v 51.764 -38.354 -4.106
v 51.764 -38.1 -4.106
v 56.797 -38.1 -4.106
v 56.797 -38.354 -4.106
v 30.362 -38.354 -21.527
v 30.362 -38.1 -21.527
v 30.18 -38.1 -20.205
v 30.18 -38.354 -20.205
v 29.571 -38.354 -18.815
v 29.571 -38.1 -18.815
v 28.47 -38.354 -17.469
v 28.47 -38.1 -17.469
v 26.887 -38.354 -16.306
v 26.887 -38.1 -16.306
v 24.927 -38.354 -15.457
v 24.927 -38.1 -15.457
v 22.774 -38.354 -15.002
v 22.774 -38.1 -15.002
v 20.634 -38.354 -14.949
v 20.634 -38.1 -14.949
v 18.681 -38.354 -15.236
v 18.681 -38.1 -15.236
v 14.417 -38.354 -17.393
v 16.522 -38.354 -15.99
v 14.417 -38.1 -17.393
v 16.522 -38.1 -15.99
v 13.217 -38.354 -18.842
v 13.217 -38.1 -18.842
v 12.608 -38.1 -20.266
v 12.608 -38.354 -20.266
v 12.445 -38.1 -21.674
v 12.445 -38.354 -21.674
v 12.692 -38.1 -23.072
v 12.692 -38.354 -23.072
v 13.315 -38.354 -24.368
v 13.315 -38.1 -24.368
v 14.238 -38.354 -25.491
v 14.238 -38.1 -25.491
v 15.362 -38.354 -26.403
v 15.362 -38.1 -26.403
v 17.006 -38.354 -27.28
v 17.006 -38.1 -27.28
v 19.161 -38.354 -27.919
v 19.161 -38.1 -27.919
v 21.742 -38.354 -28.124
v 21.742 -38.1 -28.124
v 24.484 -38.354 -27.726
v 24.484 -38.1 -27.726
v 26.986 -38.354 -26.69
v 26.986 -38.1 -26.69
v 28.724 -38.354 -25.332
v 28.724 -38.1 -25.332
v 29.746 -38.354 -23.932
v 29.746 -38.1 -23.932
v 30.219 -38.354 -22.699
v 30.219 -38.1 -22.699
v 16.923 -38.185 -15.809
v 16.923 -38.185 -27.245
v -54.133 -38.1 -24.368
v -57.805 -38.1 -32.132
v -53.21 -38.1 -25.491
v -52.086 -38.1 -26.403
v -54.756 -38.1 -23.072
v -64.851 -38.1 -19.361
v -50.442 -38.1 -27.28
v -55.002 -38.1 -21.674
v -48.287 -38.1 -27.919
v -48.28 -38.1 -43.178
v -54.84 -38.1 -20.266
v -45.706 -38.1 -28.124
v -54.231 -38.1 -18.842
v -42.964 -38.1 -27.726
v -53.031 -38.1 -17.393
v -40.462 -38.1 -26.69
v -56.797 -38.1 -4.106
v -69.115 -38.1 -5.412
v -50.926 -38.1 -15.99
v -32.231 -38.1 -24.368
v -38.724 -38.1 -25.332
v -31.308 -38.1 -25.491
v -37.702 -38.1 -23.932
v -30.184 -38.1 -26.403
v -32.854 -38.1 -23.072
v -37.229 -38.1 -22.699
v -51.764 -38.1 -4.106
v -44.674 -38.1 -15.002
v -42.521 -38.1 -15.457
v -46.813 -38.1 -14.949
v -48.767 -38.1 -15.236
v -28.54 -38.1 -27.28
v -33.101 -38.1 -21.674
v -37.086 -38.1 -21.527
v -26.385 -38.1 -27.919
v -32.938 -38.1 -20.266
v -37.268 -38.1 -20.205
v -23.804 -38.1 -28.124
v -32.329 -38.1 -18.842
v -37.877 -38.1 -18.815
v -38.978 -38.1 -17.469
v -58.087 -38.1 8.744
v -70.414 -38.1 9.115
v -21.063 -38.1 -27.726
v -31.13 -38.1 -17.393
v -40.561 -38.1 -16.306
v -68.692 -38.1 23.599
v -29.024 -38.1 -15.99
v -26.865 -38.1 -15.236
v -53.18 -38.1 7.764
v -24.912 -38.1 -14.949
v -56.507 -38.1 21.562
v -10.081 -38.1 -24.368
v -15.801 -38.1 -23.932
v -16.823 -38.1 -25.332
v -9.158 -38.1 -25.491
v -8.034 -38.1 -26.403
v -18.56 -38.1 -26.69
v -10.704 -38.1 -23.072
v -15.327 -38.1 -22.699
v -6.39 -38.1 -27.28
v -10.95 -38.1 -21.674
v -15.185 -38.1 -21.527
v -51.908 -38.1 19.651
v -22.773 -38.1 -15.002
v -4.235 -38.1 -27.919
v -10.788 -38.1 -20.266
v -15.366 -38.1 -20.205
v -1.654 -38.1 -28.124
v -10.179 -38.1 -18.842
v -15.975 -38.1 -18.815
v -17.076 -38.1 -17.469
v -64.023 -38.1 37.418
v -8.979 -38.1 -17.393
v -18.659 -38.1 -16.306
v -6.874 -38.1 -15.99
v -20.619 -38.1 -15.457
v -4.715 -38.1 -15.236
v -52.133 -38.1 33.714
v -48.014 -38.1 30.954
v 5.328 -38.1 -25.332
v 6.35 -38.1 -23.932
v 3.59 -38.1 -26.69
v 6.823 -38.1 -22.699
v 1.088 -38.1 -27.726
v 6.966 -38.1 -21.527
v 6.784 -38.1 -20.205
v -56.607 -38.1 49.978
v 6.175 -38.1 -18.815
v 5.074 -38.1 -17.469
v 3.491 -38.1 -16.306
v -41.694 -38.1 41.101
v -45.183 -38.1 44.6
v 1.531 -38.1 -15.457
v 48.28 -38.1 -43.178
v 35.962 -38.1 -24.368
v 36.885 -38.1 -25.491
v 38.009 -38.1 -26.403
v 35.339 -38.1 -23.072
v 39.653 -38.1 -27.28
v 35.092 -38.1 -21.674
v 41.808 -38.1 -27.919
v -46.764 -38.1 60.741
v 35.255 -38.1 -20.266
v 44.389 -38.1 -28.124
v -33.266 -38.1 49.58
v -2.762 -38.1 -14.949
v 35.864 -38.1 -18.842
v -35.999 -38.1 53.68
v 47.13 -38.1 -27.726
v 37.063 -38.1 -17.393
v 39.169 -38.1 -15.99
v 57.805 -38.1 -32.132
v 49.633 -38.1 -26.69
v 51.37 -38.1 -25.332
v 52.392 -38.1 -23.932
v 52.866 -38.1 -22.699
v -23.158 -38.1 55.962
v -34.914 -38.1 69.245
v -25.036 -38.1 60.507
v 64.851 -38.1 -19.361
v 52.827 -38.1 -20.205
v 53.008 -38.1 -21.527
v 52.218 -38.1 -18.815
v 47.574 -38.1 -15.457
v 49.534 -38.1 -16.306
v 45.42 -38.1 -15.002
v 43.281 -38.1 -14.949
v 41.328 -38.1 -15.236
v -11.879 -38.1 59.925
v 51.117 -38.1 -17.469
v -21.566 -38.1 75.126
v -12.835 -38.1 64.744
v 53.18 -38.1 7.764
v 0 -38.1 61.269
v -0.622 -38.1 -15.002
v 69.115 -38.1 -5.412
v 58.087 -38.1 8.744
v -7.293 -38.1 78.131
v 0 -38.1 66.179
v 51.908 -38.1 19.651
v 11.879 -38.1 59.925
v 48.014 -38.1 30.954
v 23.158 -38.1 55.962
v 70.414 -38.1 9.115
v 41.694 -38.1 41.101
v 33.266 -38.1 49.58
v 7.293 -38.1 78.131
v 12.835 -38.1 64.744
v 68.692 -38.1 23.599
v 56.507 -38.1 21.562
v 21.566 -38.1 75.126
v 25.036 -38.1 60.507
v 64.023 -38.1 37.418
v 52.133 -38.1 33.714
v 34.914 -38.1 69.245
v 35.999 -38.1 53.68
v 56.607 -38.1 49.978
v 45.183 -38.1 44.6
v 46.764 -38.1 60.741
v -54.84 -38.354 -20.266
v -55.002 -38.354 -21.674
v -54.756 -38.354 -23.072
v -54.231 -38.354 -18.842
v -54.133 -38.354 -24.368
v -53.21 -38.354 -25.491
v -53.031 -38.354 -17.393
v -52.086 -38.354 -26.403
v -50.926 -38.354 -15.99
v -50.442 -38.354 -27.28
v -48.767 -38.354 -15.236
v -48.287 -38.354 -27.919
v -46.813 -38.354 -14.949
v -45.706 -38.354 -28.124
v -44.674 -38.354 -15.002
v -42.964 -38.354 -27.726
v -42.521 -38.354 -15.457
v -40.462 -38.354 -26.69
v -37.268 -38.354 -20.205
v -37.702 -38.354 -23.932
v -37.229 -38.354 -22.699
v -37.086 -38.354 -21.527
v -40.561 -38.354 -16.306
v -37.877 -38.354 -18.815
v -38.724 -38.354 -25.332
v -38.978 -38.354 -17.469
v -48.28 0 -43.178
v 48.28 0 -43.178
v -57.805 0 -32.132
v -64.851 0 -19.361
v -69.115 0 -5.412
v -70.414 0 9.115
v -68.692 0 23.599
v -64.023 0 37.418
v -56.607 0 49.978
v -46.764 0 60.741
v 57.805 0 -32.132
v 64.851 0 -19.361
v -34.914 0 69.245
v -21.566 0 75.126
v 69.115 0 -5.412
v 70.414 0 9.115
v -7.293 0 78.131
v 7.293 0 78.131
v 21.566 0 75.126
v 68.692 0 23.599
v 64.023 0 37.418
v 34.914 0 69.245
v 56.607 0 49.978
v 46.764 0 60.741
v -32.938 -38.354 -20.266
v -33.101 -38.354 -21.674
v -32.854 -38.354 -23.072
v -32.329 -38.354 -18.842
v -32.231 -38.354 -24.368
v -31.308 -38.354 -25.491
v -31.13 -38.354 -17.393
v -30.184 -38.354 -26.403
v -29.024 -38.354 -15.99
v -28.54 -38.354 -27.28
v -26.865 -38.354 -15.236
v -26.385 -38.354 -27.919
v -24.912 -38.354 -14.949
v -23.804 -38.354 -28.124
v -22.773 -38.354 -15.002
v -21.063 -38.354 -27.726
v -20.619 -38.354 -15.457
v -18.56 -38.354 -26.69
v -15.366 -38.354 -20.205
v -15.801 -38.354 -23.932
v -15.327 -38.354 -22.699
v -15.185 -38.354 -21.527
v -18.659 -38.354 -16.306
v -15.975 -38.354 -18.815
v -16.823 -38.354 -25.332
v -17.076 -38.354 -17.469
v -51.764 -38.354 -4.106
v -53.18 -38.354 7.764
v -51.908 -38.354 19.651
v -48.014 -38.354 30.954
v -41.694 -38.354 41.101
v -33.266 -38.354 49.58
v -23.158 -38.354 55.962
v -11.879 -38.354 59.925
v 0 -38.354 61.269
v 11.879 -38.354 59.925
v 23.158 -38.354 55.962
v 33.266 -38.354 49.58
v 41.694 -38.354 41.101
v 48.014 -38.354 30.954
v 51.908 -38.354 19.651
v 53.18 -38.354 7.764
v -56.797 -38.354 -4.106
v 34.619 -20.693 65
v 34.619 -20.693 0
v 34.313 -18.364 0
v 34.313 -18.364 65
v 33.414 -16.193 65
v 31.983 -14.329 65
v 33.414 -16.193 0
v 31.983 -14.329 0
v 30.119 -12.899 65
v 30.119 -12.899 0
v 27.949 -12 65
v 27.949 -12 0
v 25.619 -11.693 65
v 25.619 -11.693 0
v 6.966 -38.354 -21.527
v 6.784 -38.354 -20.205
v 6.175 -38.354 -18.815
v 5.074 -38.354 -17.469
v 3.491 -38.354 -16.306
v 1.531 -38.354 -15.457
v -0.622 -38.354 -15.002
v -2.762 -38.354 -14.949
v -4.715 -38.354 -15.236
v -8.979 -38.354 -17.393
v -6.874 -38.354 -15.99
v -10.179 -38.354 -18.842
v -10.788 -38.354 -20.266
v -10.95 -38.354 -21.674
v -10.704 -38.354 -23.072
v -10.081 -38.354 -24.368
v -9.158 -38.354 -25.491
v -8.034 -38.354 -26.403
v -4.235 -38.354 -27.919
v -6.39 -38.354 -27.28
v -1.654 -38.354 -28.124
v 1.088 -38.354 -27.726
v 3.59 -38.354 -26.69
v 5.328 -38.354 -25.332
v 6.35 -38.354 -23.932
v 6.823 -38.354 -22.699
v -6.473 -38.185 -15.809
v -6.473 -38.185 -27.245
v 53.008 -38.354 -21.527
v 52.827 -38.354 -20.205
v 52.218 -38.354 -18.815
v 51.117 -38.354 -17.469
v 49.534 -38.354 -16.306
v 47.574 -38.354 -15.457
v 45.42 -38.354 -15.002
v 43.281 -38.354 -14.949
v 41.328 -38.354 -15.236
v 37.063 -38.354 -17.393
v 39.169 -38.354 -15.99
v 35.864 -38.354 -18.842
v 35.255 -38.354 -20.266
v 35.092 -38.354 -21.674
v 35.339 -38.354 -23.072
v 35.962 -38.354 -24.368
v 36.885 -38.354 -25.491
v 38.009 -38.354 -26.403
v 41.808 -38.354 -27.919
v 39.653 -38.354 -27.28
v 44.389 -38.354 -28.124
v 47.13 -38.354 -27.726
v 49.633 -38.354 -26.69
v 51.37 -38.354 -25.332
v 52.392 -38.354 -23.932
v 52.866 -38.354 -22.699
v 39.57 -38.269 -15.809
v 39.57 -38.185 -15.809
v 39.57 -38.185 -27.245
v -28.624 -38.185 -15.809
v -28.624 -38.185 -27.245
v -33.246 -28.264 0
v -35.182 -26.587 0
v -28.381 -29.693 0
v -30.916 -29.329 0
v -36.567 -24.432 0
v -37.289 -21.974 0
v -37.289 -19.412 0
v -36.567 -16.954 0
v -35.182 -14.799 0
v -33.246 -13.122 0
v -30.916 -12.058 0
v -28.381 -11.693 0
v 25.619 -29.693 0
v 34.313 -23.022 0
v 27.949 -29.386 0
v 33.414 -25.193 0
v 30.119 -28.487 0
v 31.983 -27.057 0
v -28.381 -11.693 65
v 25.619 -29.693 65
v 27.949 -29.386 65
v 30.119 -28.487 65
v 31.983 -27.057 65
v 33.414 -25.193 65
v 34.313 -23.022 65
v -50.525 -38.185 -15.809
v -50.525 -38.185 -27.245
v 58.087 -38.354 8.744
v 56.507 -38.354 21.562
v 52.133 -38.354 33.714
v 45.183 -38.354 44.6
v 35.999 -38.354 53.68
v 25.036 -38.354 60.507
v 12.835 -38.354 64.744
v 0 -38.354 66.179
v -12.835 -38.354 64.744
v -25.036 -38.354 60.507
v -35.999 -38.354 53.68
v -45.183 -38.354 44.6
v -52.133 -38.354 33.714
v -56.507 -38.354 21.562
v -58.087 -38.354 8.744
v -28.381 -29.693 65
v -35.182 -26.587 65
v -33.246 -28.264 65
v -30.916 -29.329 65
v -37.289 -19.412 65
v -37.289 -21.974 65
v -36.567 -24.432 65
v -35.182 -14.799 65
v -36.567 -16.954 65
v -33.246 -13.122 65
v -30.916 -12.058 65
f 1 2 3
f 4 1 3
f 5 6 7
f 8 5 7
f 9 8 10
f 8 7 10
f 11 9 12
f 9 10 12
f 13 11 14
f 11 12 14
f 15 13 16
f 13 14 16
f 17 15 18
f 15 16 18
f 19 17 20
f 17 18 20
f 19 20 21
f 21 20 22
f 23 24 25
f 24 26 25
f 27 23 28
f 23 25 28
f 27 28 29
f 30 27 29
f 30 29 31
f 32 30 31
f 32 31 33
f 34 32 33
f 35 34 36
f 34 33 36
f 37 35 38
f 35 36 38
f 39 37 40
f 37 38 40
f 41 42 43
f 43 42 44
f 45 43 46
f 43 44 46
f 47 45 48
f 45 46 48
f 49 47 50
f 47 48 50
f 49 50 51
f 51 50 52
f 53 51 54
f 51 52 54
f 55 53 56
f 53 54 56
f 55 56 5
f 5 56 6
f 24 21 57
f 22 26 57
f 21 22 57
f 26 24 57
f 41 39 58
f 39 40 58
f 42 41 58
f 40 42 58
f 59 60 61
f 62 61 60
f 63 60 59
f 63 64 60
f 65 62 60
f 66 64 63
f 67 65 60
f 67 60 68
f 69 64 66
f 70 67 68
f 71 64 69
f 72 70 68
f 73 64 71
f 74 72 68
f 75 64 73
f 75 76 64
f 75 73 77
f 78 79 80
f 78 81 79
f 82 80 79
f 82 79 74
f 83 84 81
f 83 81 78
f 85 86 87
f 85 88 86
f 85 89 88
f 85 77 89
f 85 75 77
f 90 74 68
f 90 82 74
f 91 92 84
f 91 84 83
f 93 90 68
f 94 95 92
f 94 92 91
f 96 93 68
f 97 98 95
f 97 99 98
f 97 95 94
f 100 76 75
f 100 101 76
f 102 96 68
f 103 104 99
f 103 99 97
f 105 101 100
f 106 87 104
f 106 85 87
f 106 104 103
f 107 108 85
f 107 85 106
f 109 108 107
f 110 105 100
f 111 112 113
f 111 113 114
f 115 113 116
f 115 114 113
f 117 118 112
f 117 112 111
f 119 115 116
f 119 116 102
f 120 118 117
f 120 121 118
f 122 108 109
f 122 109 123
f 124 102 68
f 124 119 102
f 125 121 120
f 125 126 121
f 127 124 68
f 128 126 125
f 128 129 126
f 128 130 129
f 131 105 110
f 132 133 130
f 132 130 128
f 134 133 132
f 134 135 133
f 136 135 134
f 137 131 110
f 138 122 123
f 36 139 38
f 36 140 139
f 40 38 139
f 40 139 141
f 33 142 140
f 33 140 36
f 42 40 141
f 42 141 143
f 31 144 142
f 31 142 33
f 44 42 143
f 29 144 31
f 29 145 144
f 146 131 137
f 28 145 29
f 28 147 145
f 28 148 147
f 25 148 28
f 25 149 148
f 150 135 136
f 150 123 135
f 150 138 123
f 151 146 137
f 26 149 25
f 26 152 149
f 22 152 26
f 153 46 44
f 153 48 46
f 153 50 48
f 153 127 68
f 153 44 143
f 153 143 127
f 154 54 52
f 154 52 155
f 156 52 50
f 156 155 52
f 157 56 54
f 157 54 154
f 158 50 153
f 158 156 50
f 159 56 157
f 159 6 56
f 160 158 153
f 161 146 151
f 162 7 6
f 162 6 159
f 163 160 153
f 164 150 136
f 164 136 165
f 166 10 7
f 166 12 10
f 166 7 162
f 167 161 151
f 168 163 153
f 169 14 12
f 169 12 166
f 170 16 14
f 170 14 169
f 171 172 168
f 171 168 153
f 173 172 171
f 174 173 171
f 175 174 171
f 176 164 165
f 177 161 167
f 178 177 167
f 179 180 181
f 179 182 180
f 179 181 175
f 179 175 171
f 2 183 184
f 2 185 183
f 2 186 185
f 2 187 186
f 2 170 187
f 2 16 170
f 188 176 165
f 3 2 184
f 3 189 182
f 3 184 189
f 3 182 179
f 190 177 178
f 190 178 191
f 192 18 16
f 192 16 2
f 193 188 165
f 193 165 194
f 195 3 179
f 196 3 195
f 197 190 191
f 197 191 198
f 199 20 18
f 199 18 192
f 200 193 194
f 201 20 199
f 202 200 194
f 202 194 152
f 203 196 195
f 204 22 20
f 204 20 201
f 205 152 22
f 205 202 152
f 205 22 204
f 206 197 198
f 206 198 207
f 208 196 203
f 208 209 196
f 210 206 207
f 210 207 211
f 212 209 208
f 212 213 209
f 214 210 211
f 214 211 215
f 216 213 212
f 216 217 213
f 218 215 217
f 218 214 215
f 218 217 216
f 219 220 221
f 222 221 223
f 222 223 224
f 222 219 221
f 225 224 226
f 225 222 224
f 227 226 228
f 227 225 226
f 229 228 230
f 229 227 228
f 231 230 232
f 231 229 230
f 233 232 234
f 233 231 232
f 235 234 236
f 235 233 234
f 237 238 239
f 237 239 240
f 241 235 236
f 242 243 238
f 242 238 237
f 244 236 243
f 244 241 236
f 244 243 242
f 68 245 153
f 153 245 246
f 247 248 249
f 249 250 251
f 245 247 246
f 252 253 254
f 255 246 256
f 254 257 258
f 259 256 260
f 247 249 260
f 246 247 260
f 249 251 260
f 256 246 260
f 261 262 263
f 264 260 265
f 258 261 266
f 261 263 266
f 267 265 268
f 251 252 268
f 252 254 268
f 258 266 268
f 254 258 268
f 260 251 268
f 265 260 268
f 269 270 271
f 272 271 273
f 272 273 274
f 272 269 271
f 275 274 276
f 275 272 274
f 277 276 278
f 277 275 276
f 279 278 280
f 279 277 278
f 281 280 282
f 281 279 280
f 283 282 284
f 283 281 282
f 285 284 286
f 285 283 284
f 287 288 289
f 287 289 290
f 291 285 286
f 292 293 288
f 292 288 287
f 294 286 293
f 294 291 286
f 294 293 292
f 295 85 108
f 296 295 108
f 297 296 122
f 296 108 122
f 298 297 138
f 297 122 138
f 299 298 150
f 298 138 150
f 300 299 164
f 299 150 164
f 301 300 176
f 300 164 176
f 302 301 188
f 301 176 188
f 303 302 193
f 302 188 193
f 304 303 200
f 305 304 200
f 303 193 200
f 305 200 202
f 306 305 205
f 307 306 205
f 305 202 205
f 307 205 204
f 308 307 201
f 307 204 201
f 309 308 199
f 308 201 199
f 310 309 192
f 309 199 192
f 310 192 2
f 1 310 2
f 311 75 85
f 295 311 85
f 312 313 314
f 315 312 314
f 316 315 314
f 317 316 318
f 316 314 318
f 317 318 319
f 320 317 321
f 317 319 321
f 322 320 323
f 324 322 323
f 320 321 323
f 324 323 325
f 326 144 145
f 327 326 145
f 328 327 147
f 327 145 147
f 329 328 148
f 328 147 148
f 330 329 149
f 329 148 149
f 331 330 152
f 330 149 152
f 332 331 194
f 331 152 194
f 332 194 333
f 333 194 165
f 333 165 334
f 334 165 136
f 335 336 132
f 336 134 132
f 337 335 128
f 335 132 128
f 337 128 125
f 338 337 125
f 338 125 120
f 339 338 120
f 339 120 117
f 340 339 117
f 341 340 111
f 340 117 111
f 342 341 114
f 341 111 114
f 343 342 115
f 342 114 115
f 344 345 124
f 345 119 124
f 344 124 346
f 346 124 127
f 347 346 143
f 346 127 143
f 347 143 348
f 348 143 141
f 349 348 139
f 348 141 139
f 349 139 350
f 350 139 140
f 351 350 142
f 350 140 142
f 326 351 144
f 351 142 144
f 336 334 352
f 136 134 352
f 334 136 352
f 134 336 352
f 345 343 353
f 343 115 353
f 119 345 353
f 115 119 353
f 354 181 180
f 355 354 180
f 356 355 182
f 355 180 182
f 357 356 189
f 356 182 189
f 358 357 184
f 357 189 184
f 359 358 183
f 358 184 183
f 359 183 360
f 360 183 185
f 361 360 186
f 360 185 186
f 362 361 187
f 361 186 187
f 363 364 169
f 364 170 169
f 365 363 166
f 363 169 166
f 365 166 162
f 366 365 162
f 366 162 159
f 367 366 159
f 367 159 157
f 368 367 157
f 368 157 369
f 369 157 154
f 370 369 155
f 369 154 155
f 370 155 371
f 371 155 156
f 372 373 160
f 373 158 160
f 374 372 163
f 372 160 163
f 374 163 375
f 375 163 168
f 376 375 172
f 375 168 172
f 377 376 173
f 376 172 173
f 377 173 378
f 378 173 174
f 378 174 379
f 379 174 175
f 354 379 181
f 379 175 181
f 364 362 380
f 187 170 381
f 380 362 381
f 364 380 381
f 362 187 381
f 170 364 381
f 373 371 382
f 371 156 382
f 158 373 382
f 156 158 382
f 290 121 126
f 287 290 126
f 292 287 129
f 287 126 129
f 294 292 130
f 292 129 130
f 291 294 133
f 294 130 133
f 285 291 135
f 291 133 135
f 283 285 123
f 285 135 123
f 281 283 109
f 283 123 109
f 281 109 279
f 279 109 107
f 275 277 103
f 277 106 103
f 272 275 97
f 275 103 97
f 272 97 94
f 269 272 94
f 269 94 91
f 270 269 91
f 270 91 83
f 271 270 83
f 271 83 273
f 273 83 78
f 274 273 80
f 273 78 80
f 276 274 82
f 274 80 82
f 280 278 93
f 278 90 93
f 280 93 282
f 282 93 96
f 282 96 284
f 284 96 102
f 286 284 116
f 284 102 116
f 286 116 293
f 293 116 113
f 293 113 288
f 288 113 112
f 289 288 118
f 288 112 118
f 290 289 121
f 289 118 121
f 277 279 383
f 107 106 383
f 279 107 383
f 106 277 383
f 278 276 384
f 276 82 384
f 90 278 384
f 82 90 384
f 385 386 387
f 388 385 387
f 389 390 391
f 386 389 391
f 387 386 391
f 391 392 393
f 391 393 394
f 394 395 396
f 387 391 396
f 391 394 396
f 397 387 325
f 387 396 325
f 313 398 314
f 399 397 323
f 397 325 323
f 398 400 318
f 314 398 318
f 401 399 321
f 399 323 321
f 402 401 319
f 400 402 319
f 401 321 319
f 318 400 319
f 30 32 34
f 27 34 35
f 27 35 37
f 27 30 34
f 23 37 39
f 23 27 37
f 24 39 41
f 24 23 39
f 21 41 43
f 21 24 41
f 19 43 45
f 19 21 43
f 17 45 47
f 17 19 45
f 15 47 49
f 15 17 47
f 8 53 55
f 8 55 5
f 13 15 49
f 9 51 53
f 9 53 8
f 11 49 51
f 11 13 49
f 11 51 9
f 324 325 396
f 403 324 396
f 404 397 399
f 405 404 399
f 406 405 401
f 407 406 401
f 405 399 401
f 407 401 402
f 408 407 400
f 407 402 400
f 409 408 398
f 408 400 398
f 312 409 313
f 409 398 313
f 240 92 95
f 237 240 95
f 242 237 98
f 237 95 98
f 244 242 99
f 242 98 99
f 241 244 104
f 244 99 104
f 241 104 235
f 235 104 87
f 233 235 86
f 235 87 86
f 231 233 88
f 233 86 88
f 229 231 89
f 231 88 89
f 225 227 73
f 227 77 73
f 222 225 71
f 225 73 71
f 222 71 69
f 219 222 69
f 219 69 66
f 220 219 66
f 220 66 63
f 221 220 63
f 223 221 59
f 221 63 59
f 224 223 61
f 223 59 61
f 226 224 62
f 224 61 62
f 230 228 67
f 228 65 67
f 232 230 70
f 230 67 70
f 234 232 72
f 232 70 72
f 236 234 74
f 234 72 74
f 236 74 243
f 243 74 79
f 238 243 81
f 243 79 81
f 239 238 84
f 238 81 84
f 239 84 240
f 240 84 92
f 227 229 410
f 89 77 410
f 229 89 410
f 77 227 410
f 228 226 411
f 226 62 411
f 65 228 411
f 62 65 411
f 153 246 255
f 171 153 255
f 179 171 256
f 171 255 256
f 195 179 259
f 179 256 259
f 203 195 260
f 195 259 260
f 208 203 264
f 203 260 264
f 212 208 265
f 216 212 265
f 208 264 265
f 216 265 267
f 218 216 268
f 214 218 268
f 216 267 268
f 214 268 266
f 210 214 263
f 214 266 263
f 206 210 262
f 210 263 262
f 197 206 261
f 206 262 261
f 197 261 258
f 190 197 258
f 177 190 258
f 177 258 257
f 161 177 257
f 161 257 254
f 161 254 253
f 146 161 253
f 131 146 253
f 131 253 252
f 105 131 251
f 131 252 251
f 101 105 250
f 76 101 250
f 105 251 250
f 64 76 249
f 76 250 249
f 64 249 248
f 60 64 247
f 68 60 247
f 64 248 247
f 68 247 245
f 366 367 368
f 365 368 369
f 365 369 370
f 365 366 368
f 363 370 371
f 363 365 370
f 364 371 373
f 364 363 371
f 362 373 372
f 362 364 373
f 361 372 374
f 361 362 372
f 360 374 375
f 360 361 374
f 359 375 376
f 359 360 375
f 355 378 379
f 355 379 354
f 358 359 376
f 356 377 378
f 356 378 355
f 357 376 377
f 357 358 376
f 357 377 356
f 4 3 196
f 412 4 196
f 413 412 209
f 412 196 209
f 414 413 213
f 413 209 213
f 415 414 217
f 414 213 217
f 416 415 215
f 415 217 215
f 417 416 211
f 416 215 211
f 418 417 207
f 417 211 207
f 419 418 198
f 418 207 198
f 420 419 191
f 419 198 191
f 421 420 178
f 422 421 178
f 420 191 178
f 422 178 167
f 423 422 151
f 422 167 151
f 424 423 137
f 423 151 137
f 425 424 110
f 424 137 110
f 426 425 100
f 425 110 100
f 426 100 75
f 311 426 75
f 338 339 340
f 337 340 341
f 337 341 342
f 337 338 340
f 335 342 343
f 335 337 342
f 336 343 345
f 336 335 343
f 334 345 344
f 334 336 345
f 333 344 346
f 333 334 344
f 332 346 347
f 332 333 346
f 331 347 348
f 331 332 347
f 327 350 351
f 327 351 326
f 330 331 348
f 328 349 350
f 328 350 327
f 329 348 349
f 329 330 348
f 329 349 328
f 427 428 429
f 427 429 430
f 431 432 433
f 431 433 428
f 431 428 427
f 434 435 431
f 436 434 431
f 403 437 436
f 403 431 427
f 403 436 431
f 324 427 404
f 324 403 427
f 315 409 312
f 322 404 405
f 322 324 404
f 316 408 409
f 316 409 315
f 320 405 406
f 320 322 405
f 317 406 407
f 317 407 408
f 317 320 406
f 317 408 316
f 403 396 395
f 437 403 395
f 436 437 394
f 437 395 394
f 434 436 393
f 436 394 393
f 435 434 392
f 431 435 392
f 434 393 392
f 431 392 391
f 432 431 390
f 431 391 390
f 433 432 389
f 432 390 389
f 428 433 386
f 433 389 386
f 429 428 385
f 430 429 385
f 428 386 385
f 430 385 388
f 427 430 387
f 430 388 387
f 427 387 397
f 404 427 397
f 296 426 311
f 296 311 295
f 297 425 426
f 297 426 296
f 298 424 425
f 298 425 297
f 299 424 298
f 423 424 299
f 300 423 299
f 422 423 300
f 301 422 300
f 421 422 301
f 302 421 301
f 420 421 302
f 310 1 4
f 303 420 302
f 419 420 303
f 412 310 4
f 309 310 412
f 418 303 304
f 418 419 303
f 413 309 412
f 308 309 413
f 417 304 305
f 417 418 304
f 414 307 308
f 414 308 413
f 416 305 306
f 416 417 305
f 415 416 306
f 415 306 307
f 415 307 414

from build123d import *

# Parameters (mm, degrees)
F1_DEPTH = 38.1
F3_DEPTH = 0.254
F5_DEPTH = 65


with BuildPart() as f1:
    # F0 (on Front) → F1 (new body)
    with BuildSketch(Plane.XZ):
        with BuildLine():
            ThreePointArc((48.2797399163, -43.178036809), (0, 78.5093375194), (-48.2797399163, -43.178036809))
            Line((-48.2797399163, -43.178036809), (48.2797399163, -43.178036809))
        make_face()
    extrude(amount=F1_DEPTH)

    # F2 (on face) → F3 (join)
    with BuildSketch(Plane.XZ.offset(38.1)):
        with BuildLine():
            add(Edge.make_bspline(
                [(-37.0862976189, -21.526746532), (-37.0862976189, -10.0909144428), (-50.524991798, -15.8088304874), (-63.9636859771, -21.526746532), (-50.524991798, -27.2446625766), (-37.0862976189, -32.9625786212), (-37.0862976189, -21.526746532)],
                knots=[0, 0, 0, 2.0943951024, 2.0943951024, 4.1887902048, 4.1887902048, 6.2831853072, 6.2831853072, 6.2831853072], degree=2, weights=[1, 0.5, 1, 0.5, 1, 0.5, 1]))
        make_face()
        with BuildLine():
            add(Edge.make_bspline(
                [(-15.1848064807, -21.526746532), (-15.1848064807, -10.0909144428), (-28.6235006598, -15.8088304874), (-42.0621948388, -21.526746532), (-28.6235006598, -27.2446625766), (-15.1848064807, -32.9625786212), (-15.1848064807, -21.526746532)],
                knots=[0, 0, 0, 2.0943951024, 2.0943951024, 4.1887902048, 4.1887902048, 6.2831853072, 6.2831853072, 6.2831853072], degree=2, weights=[1, 0.5, 1, 0.5, 1, 0.5, 1]))
        make_face()
        with BuildLine():
            add(Edge.make_bspline(
                [(6.9655476492, -21.526746532), (6.9655476492, -10.0909144428), (-6.4731465298, -15.8088304874), (-19.9118407089, -21.526746532), (-6.4731465298, -27.2446625766), (6.9655476492, -32.9625786212), (6.9655476492, -21.526746532)],
                knots=[0, 0, 0, 2.0943951024, 2.0943951024, 4.1887902048, 4.1887902048, 6.2831853072, 6.2831853072, 6.2831853072], degree=2, weights=[1, 0.5, 1, 0.5, 1, 0.5, 1]))
        make_face()
        with BuildLine():
            add(Edge.make_bspline(
                [(30.36152079, -21.526746532), (30.36152079, -10.0909144428), (16.9228266109, -15.8088304874), (3.4841324318, -21.526746532), (16.9228266109, -27.2446625766), (30.36152079, -32.9625786212), (30.36152079, -21.526746532)],
                knots=[0, 0, 0, 2.0943951024, 2.0943951024, 4.1887902048, 4.1887902048, 6.2831853072, 6.2831853072, 6.2831853072], degree=2, weights=[1, 0.5, 1, 0.5, 1, 0.5, 1]))
        make_face()
        with BuildLine():
            add(Edge.make_bspline(
                [(53.0082075507, -21.526746532), (53.0082075507, -10.0909144428), (39.5695133716, -15.8088304874), (26.1308191926, -21.526746532), (39.5695133716, -27.2446625766), (53.0082075507, -32.9625786212), (53.0082075507, -21.526746532)],
                knots=[0, 0, 0, 2.0943951024, 2.0943951024, 4.1887902048, 4.1887902048, 6.2831853072, 6.2831853072, 6.2831853072], degree=2, weights=[1, 0.5, 1, 0.5, 1, 0.5, 1]))
        make_face()
        with BuildLine():
            ThreePointArc((56.7967976493, -4.106244538), (0, 66.1792234388), (-56.7967976493, -4.106244538))
            Line((-56.7967976493, -4.106244538), (-51.7638213933, -4.106244538))
            ThreePointArc((-51.7638213933, -4.106244538), (0, 61.2688820478), (51.7638213933, -4.106244538))
            Line((51.7638213933, -4.106244538), (56.7967976493, -4.106244538))
        make_face()
    extrude(amount=F3_DEPTH)


with BuildPart() as f5:
    # F4 (on Top) → F5 (new body)
    with BuildSketch(Plane.XY):
        with BuildLine():
            ThreePointArc((-28.3806738406, -29.6931233406), (-22.01671281, -27.0570843713), (-19.3806738406, -20.6931233406))
            ThreePointArc((-19.3806738406, -20.6931233406), (-22.01671281, -14.3291623099), (-28.3806738406, -11.6931233406))
            ThreePointArc((-28.3806738406, -11.6931233406), (-37.3806738406, -20.6931233406), (-28.3806738406, -29.6931233406))
        make_face()
        with BuildLine():
            ThreePointArc((-10.3806738406, -29.6931233406), (-16.7446348713, -27.0570843713), (-19.3806738406, -20.6931233406))
            ThreePointArc((-19.3806738406, -20.6931233406), (-22.01671281, -27.0570843713), (-28.3806738406, -29.6931233406))
            Line((-28.3806738406, -29.6931233406), (-10.3806738406, -29.6931233406))
        make_face()
        with BuildLine():
            ThreePointArc((-28.3806738406, -11.6931233406), (-22.01671281, -14.3291623099), (-19.3806738406, -20.6931233406))
            ThreePointArc((-19.3806738406, -20.6931233406), (-16.7446348658, -14.3291623044), (-10.380673825, -11.6931233406))
            Line((-10.380673825, -11.6931233406), (-28.3806738406, -11.6931233406))
        make_face()
        with BuildLine():
            ThreePointArc((-10.380673825, -11.6931233406), (-16.7446348658, -14.3291623044), (-19.3806738406, -20.6931233406))
            ThreePointArc((-19.3806738406, -20.6931233406), (-16.7446348713, -27.0570843713), (-10.3806738406, -29.6931233406))
            ThreePointArc((-10.3806738406, -29.6931233406), (-4.01671281, -27.0570843713), (-1.3806738406, -20.6931233406))
            ThreePointArc((-1.3806738406, -20.6931233406), (-4.0167128044, -14.3291623155), (-10.380673825, -11.6931233406))
        make_face()
        with BuildLine():
            Line((7.6193261924, -11.6931233406), (-10.380673825, -11.6931233406))
            ThreePointArc((-10.380673825, -11.6931233406), (-4.0167128044, -14.3291623155), (-1.3806738406, -20.6931233406))
            ThreePointArc((-1.3806738406, -20.6931233406), (1.2553651404, -14.3291622982), (7.6193261924, -11.6931233406))
        make_face()
        with BuildLine():
            ThreePointArc((-1.3806738406, -20.6931233406), (-4.01671281, -27.0570843713), (-10.3806738406, -29.6931233406))
            Line((-10.3806738406, -29.6931233406), (7.6193261683, -29.6931233406))
            ThreePointArc((7.6193261683, -29.6931233406), (1.2553651318, -27.0570843744), (-1.3806738406, -20.6931233406))
        make_face()
        with BuildLine():
            ThreePointArc((7.6193261924, -11.6931233406), (1.2553651404, -14.3291622982), (-1.3806738406, -20.6931233406))
            ThreePointArc((-1.3806738406, -20.6931233406), (1.2553651318, -27.0570843744), (7.6193261683, -29.6931233406))
            ThreePointArc((7.6193261683, -29.6931233406), (13.9832871932, -27.0570843681), (16.6193261594, -20.6931233406))
            ThreePointArc((16.6193261594, -20.6931233406), (13.9832872017, -14.3291623216), (7.6193261924, -11.6931233406))
        make_face()
        with BuildLine():
            Line((25.6193261594, -11.6931233406), (7.6193261924, -11.6931233406))
            ThreePointArc((7.6193261924, -11.6931233406), (13.9832872017, -14.3291623216), (16.6193261594, -20.6931233406))
            ThreePointArc((16.6193261594, -20.6931233406), (19.2553651287, -14.3291623099), (25.6193261594, -11.6931233406))
        make_face()
        with BuildLine():
            ThreePointArc((16.6193261594, -20.6931233406), (13.9832871932, -27.0570843681), (7.6193261683, -29.6931233406))
            Line((7.6193261683, -29.6931233406), (25.6193261594, -29.6931233406))
            ThreePointArc((25.6193261594, -29.6931233406), (19.2553651287, -27.0570843713), (16.6193261594, -20.6931233406))
        make_face()
        with BuildLine():
            ThreePointArc((25.6193261594, -11.6931233406), (19.2553651287, -14.3291623099), (16.6193261594, -20.6931233406))
            ThreePointArc((16.6193261594, -20.6931233406), (19.2553651287, -27.0570843713), (25.6193261594, -29.6931233406))
            ThreePointArc((25.6193261594, -29.6931233406), (31.98328719, -27.0570843713), (34.6193261594, -20.6931233406))
            ThreePointArc((34.6193261594, -20.6931233406), (31.98328719, -14.3291623099), (25.6193261594, -11.6931233406))
        make_face()
    extrude(amount=F5_DEPTH)


solid = Compound([f1.part, f5.part])
